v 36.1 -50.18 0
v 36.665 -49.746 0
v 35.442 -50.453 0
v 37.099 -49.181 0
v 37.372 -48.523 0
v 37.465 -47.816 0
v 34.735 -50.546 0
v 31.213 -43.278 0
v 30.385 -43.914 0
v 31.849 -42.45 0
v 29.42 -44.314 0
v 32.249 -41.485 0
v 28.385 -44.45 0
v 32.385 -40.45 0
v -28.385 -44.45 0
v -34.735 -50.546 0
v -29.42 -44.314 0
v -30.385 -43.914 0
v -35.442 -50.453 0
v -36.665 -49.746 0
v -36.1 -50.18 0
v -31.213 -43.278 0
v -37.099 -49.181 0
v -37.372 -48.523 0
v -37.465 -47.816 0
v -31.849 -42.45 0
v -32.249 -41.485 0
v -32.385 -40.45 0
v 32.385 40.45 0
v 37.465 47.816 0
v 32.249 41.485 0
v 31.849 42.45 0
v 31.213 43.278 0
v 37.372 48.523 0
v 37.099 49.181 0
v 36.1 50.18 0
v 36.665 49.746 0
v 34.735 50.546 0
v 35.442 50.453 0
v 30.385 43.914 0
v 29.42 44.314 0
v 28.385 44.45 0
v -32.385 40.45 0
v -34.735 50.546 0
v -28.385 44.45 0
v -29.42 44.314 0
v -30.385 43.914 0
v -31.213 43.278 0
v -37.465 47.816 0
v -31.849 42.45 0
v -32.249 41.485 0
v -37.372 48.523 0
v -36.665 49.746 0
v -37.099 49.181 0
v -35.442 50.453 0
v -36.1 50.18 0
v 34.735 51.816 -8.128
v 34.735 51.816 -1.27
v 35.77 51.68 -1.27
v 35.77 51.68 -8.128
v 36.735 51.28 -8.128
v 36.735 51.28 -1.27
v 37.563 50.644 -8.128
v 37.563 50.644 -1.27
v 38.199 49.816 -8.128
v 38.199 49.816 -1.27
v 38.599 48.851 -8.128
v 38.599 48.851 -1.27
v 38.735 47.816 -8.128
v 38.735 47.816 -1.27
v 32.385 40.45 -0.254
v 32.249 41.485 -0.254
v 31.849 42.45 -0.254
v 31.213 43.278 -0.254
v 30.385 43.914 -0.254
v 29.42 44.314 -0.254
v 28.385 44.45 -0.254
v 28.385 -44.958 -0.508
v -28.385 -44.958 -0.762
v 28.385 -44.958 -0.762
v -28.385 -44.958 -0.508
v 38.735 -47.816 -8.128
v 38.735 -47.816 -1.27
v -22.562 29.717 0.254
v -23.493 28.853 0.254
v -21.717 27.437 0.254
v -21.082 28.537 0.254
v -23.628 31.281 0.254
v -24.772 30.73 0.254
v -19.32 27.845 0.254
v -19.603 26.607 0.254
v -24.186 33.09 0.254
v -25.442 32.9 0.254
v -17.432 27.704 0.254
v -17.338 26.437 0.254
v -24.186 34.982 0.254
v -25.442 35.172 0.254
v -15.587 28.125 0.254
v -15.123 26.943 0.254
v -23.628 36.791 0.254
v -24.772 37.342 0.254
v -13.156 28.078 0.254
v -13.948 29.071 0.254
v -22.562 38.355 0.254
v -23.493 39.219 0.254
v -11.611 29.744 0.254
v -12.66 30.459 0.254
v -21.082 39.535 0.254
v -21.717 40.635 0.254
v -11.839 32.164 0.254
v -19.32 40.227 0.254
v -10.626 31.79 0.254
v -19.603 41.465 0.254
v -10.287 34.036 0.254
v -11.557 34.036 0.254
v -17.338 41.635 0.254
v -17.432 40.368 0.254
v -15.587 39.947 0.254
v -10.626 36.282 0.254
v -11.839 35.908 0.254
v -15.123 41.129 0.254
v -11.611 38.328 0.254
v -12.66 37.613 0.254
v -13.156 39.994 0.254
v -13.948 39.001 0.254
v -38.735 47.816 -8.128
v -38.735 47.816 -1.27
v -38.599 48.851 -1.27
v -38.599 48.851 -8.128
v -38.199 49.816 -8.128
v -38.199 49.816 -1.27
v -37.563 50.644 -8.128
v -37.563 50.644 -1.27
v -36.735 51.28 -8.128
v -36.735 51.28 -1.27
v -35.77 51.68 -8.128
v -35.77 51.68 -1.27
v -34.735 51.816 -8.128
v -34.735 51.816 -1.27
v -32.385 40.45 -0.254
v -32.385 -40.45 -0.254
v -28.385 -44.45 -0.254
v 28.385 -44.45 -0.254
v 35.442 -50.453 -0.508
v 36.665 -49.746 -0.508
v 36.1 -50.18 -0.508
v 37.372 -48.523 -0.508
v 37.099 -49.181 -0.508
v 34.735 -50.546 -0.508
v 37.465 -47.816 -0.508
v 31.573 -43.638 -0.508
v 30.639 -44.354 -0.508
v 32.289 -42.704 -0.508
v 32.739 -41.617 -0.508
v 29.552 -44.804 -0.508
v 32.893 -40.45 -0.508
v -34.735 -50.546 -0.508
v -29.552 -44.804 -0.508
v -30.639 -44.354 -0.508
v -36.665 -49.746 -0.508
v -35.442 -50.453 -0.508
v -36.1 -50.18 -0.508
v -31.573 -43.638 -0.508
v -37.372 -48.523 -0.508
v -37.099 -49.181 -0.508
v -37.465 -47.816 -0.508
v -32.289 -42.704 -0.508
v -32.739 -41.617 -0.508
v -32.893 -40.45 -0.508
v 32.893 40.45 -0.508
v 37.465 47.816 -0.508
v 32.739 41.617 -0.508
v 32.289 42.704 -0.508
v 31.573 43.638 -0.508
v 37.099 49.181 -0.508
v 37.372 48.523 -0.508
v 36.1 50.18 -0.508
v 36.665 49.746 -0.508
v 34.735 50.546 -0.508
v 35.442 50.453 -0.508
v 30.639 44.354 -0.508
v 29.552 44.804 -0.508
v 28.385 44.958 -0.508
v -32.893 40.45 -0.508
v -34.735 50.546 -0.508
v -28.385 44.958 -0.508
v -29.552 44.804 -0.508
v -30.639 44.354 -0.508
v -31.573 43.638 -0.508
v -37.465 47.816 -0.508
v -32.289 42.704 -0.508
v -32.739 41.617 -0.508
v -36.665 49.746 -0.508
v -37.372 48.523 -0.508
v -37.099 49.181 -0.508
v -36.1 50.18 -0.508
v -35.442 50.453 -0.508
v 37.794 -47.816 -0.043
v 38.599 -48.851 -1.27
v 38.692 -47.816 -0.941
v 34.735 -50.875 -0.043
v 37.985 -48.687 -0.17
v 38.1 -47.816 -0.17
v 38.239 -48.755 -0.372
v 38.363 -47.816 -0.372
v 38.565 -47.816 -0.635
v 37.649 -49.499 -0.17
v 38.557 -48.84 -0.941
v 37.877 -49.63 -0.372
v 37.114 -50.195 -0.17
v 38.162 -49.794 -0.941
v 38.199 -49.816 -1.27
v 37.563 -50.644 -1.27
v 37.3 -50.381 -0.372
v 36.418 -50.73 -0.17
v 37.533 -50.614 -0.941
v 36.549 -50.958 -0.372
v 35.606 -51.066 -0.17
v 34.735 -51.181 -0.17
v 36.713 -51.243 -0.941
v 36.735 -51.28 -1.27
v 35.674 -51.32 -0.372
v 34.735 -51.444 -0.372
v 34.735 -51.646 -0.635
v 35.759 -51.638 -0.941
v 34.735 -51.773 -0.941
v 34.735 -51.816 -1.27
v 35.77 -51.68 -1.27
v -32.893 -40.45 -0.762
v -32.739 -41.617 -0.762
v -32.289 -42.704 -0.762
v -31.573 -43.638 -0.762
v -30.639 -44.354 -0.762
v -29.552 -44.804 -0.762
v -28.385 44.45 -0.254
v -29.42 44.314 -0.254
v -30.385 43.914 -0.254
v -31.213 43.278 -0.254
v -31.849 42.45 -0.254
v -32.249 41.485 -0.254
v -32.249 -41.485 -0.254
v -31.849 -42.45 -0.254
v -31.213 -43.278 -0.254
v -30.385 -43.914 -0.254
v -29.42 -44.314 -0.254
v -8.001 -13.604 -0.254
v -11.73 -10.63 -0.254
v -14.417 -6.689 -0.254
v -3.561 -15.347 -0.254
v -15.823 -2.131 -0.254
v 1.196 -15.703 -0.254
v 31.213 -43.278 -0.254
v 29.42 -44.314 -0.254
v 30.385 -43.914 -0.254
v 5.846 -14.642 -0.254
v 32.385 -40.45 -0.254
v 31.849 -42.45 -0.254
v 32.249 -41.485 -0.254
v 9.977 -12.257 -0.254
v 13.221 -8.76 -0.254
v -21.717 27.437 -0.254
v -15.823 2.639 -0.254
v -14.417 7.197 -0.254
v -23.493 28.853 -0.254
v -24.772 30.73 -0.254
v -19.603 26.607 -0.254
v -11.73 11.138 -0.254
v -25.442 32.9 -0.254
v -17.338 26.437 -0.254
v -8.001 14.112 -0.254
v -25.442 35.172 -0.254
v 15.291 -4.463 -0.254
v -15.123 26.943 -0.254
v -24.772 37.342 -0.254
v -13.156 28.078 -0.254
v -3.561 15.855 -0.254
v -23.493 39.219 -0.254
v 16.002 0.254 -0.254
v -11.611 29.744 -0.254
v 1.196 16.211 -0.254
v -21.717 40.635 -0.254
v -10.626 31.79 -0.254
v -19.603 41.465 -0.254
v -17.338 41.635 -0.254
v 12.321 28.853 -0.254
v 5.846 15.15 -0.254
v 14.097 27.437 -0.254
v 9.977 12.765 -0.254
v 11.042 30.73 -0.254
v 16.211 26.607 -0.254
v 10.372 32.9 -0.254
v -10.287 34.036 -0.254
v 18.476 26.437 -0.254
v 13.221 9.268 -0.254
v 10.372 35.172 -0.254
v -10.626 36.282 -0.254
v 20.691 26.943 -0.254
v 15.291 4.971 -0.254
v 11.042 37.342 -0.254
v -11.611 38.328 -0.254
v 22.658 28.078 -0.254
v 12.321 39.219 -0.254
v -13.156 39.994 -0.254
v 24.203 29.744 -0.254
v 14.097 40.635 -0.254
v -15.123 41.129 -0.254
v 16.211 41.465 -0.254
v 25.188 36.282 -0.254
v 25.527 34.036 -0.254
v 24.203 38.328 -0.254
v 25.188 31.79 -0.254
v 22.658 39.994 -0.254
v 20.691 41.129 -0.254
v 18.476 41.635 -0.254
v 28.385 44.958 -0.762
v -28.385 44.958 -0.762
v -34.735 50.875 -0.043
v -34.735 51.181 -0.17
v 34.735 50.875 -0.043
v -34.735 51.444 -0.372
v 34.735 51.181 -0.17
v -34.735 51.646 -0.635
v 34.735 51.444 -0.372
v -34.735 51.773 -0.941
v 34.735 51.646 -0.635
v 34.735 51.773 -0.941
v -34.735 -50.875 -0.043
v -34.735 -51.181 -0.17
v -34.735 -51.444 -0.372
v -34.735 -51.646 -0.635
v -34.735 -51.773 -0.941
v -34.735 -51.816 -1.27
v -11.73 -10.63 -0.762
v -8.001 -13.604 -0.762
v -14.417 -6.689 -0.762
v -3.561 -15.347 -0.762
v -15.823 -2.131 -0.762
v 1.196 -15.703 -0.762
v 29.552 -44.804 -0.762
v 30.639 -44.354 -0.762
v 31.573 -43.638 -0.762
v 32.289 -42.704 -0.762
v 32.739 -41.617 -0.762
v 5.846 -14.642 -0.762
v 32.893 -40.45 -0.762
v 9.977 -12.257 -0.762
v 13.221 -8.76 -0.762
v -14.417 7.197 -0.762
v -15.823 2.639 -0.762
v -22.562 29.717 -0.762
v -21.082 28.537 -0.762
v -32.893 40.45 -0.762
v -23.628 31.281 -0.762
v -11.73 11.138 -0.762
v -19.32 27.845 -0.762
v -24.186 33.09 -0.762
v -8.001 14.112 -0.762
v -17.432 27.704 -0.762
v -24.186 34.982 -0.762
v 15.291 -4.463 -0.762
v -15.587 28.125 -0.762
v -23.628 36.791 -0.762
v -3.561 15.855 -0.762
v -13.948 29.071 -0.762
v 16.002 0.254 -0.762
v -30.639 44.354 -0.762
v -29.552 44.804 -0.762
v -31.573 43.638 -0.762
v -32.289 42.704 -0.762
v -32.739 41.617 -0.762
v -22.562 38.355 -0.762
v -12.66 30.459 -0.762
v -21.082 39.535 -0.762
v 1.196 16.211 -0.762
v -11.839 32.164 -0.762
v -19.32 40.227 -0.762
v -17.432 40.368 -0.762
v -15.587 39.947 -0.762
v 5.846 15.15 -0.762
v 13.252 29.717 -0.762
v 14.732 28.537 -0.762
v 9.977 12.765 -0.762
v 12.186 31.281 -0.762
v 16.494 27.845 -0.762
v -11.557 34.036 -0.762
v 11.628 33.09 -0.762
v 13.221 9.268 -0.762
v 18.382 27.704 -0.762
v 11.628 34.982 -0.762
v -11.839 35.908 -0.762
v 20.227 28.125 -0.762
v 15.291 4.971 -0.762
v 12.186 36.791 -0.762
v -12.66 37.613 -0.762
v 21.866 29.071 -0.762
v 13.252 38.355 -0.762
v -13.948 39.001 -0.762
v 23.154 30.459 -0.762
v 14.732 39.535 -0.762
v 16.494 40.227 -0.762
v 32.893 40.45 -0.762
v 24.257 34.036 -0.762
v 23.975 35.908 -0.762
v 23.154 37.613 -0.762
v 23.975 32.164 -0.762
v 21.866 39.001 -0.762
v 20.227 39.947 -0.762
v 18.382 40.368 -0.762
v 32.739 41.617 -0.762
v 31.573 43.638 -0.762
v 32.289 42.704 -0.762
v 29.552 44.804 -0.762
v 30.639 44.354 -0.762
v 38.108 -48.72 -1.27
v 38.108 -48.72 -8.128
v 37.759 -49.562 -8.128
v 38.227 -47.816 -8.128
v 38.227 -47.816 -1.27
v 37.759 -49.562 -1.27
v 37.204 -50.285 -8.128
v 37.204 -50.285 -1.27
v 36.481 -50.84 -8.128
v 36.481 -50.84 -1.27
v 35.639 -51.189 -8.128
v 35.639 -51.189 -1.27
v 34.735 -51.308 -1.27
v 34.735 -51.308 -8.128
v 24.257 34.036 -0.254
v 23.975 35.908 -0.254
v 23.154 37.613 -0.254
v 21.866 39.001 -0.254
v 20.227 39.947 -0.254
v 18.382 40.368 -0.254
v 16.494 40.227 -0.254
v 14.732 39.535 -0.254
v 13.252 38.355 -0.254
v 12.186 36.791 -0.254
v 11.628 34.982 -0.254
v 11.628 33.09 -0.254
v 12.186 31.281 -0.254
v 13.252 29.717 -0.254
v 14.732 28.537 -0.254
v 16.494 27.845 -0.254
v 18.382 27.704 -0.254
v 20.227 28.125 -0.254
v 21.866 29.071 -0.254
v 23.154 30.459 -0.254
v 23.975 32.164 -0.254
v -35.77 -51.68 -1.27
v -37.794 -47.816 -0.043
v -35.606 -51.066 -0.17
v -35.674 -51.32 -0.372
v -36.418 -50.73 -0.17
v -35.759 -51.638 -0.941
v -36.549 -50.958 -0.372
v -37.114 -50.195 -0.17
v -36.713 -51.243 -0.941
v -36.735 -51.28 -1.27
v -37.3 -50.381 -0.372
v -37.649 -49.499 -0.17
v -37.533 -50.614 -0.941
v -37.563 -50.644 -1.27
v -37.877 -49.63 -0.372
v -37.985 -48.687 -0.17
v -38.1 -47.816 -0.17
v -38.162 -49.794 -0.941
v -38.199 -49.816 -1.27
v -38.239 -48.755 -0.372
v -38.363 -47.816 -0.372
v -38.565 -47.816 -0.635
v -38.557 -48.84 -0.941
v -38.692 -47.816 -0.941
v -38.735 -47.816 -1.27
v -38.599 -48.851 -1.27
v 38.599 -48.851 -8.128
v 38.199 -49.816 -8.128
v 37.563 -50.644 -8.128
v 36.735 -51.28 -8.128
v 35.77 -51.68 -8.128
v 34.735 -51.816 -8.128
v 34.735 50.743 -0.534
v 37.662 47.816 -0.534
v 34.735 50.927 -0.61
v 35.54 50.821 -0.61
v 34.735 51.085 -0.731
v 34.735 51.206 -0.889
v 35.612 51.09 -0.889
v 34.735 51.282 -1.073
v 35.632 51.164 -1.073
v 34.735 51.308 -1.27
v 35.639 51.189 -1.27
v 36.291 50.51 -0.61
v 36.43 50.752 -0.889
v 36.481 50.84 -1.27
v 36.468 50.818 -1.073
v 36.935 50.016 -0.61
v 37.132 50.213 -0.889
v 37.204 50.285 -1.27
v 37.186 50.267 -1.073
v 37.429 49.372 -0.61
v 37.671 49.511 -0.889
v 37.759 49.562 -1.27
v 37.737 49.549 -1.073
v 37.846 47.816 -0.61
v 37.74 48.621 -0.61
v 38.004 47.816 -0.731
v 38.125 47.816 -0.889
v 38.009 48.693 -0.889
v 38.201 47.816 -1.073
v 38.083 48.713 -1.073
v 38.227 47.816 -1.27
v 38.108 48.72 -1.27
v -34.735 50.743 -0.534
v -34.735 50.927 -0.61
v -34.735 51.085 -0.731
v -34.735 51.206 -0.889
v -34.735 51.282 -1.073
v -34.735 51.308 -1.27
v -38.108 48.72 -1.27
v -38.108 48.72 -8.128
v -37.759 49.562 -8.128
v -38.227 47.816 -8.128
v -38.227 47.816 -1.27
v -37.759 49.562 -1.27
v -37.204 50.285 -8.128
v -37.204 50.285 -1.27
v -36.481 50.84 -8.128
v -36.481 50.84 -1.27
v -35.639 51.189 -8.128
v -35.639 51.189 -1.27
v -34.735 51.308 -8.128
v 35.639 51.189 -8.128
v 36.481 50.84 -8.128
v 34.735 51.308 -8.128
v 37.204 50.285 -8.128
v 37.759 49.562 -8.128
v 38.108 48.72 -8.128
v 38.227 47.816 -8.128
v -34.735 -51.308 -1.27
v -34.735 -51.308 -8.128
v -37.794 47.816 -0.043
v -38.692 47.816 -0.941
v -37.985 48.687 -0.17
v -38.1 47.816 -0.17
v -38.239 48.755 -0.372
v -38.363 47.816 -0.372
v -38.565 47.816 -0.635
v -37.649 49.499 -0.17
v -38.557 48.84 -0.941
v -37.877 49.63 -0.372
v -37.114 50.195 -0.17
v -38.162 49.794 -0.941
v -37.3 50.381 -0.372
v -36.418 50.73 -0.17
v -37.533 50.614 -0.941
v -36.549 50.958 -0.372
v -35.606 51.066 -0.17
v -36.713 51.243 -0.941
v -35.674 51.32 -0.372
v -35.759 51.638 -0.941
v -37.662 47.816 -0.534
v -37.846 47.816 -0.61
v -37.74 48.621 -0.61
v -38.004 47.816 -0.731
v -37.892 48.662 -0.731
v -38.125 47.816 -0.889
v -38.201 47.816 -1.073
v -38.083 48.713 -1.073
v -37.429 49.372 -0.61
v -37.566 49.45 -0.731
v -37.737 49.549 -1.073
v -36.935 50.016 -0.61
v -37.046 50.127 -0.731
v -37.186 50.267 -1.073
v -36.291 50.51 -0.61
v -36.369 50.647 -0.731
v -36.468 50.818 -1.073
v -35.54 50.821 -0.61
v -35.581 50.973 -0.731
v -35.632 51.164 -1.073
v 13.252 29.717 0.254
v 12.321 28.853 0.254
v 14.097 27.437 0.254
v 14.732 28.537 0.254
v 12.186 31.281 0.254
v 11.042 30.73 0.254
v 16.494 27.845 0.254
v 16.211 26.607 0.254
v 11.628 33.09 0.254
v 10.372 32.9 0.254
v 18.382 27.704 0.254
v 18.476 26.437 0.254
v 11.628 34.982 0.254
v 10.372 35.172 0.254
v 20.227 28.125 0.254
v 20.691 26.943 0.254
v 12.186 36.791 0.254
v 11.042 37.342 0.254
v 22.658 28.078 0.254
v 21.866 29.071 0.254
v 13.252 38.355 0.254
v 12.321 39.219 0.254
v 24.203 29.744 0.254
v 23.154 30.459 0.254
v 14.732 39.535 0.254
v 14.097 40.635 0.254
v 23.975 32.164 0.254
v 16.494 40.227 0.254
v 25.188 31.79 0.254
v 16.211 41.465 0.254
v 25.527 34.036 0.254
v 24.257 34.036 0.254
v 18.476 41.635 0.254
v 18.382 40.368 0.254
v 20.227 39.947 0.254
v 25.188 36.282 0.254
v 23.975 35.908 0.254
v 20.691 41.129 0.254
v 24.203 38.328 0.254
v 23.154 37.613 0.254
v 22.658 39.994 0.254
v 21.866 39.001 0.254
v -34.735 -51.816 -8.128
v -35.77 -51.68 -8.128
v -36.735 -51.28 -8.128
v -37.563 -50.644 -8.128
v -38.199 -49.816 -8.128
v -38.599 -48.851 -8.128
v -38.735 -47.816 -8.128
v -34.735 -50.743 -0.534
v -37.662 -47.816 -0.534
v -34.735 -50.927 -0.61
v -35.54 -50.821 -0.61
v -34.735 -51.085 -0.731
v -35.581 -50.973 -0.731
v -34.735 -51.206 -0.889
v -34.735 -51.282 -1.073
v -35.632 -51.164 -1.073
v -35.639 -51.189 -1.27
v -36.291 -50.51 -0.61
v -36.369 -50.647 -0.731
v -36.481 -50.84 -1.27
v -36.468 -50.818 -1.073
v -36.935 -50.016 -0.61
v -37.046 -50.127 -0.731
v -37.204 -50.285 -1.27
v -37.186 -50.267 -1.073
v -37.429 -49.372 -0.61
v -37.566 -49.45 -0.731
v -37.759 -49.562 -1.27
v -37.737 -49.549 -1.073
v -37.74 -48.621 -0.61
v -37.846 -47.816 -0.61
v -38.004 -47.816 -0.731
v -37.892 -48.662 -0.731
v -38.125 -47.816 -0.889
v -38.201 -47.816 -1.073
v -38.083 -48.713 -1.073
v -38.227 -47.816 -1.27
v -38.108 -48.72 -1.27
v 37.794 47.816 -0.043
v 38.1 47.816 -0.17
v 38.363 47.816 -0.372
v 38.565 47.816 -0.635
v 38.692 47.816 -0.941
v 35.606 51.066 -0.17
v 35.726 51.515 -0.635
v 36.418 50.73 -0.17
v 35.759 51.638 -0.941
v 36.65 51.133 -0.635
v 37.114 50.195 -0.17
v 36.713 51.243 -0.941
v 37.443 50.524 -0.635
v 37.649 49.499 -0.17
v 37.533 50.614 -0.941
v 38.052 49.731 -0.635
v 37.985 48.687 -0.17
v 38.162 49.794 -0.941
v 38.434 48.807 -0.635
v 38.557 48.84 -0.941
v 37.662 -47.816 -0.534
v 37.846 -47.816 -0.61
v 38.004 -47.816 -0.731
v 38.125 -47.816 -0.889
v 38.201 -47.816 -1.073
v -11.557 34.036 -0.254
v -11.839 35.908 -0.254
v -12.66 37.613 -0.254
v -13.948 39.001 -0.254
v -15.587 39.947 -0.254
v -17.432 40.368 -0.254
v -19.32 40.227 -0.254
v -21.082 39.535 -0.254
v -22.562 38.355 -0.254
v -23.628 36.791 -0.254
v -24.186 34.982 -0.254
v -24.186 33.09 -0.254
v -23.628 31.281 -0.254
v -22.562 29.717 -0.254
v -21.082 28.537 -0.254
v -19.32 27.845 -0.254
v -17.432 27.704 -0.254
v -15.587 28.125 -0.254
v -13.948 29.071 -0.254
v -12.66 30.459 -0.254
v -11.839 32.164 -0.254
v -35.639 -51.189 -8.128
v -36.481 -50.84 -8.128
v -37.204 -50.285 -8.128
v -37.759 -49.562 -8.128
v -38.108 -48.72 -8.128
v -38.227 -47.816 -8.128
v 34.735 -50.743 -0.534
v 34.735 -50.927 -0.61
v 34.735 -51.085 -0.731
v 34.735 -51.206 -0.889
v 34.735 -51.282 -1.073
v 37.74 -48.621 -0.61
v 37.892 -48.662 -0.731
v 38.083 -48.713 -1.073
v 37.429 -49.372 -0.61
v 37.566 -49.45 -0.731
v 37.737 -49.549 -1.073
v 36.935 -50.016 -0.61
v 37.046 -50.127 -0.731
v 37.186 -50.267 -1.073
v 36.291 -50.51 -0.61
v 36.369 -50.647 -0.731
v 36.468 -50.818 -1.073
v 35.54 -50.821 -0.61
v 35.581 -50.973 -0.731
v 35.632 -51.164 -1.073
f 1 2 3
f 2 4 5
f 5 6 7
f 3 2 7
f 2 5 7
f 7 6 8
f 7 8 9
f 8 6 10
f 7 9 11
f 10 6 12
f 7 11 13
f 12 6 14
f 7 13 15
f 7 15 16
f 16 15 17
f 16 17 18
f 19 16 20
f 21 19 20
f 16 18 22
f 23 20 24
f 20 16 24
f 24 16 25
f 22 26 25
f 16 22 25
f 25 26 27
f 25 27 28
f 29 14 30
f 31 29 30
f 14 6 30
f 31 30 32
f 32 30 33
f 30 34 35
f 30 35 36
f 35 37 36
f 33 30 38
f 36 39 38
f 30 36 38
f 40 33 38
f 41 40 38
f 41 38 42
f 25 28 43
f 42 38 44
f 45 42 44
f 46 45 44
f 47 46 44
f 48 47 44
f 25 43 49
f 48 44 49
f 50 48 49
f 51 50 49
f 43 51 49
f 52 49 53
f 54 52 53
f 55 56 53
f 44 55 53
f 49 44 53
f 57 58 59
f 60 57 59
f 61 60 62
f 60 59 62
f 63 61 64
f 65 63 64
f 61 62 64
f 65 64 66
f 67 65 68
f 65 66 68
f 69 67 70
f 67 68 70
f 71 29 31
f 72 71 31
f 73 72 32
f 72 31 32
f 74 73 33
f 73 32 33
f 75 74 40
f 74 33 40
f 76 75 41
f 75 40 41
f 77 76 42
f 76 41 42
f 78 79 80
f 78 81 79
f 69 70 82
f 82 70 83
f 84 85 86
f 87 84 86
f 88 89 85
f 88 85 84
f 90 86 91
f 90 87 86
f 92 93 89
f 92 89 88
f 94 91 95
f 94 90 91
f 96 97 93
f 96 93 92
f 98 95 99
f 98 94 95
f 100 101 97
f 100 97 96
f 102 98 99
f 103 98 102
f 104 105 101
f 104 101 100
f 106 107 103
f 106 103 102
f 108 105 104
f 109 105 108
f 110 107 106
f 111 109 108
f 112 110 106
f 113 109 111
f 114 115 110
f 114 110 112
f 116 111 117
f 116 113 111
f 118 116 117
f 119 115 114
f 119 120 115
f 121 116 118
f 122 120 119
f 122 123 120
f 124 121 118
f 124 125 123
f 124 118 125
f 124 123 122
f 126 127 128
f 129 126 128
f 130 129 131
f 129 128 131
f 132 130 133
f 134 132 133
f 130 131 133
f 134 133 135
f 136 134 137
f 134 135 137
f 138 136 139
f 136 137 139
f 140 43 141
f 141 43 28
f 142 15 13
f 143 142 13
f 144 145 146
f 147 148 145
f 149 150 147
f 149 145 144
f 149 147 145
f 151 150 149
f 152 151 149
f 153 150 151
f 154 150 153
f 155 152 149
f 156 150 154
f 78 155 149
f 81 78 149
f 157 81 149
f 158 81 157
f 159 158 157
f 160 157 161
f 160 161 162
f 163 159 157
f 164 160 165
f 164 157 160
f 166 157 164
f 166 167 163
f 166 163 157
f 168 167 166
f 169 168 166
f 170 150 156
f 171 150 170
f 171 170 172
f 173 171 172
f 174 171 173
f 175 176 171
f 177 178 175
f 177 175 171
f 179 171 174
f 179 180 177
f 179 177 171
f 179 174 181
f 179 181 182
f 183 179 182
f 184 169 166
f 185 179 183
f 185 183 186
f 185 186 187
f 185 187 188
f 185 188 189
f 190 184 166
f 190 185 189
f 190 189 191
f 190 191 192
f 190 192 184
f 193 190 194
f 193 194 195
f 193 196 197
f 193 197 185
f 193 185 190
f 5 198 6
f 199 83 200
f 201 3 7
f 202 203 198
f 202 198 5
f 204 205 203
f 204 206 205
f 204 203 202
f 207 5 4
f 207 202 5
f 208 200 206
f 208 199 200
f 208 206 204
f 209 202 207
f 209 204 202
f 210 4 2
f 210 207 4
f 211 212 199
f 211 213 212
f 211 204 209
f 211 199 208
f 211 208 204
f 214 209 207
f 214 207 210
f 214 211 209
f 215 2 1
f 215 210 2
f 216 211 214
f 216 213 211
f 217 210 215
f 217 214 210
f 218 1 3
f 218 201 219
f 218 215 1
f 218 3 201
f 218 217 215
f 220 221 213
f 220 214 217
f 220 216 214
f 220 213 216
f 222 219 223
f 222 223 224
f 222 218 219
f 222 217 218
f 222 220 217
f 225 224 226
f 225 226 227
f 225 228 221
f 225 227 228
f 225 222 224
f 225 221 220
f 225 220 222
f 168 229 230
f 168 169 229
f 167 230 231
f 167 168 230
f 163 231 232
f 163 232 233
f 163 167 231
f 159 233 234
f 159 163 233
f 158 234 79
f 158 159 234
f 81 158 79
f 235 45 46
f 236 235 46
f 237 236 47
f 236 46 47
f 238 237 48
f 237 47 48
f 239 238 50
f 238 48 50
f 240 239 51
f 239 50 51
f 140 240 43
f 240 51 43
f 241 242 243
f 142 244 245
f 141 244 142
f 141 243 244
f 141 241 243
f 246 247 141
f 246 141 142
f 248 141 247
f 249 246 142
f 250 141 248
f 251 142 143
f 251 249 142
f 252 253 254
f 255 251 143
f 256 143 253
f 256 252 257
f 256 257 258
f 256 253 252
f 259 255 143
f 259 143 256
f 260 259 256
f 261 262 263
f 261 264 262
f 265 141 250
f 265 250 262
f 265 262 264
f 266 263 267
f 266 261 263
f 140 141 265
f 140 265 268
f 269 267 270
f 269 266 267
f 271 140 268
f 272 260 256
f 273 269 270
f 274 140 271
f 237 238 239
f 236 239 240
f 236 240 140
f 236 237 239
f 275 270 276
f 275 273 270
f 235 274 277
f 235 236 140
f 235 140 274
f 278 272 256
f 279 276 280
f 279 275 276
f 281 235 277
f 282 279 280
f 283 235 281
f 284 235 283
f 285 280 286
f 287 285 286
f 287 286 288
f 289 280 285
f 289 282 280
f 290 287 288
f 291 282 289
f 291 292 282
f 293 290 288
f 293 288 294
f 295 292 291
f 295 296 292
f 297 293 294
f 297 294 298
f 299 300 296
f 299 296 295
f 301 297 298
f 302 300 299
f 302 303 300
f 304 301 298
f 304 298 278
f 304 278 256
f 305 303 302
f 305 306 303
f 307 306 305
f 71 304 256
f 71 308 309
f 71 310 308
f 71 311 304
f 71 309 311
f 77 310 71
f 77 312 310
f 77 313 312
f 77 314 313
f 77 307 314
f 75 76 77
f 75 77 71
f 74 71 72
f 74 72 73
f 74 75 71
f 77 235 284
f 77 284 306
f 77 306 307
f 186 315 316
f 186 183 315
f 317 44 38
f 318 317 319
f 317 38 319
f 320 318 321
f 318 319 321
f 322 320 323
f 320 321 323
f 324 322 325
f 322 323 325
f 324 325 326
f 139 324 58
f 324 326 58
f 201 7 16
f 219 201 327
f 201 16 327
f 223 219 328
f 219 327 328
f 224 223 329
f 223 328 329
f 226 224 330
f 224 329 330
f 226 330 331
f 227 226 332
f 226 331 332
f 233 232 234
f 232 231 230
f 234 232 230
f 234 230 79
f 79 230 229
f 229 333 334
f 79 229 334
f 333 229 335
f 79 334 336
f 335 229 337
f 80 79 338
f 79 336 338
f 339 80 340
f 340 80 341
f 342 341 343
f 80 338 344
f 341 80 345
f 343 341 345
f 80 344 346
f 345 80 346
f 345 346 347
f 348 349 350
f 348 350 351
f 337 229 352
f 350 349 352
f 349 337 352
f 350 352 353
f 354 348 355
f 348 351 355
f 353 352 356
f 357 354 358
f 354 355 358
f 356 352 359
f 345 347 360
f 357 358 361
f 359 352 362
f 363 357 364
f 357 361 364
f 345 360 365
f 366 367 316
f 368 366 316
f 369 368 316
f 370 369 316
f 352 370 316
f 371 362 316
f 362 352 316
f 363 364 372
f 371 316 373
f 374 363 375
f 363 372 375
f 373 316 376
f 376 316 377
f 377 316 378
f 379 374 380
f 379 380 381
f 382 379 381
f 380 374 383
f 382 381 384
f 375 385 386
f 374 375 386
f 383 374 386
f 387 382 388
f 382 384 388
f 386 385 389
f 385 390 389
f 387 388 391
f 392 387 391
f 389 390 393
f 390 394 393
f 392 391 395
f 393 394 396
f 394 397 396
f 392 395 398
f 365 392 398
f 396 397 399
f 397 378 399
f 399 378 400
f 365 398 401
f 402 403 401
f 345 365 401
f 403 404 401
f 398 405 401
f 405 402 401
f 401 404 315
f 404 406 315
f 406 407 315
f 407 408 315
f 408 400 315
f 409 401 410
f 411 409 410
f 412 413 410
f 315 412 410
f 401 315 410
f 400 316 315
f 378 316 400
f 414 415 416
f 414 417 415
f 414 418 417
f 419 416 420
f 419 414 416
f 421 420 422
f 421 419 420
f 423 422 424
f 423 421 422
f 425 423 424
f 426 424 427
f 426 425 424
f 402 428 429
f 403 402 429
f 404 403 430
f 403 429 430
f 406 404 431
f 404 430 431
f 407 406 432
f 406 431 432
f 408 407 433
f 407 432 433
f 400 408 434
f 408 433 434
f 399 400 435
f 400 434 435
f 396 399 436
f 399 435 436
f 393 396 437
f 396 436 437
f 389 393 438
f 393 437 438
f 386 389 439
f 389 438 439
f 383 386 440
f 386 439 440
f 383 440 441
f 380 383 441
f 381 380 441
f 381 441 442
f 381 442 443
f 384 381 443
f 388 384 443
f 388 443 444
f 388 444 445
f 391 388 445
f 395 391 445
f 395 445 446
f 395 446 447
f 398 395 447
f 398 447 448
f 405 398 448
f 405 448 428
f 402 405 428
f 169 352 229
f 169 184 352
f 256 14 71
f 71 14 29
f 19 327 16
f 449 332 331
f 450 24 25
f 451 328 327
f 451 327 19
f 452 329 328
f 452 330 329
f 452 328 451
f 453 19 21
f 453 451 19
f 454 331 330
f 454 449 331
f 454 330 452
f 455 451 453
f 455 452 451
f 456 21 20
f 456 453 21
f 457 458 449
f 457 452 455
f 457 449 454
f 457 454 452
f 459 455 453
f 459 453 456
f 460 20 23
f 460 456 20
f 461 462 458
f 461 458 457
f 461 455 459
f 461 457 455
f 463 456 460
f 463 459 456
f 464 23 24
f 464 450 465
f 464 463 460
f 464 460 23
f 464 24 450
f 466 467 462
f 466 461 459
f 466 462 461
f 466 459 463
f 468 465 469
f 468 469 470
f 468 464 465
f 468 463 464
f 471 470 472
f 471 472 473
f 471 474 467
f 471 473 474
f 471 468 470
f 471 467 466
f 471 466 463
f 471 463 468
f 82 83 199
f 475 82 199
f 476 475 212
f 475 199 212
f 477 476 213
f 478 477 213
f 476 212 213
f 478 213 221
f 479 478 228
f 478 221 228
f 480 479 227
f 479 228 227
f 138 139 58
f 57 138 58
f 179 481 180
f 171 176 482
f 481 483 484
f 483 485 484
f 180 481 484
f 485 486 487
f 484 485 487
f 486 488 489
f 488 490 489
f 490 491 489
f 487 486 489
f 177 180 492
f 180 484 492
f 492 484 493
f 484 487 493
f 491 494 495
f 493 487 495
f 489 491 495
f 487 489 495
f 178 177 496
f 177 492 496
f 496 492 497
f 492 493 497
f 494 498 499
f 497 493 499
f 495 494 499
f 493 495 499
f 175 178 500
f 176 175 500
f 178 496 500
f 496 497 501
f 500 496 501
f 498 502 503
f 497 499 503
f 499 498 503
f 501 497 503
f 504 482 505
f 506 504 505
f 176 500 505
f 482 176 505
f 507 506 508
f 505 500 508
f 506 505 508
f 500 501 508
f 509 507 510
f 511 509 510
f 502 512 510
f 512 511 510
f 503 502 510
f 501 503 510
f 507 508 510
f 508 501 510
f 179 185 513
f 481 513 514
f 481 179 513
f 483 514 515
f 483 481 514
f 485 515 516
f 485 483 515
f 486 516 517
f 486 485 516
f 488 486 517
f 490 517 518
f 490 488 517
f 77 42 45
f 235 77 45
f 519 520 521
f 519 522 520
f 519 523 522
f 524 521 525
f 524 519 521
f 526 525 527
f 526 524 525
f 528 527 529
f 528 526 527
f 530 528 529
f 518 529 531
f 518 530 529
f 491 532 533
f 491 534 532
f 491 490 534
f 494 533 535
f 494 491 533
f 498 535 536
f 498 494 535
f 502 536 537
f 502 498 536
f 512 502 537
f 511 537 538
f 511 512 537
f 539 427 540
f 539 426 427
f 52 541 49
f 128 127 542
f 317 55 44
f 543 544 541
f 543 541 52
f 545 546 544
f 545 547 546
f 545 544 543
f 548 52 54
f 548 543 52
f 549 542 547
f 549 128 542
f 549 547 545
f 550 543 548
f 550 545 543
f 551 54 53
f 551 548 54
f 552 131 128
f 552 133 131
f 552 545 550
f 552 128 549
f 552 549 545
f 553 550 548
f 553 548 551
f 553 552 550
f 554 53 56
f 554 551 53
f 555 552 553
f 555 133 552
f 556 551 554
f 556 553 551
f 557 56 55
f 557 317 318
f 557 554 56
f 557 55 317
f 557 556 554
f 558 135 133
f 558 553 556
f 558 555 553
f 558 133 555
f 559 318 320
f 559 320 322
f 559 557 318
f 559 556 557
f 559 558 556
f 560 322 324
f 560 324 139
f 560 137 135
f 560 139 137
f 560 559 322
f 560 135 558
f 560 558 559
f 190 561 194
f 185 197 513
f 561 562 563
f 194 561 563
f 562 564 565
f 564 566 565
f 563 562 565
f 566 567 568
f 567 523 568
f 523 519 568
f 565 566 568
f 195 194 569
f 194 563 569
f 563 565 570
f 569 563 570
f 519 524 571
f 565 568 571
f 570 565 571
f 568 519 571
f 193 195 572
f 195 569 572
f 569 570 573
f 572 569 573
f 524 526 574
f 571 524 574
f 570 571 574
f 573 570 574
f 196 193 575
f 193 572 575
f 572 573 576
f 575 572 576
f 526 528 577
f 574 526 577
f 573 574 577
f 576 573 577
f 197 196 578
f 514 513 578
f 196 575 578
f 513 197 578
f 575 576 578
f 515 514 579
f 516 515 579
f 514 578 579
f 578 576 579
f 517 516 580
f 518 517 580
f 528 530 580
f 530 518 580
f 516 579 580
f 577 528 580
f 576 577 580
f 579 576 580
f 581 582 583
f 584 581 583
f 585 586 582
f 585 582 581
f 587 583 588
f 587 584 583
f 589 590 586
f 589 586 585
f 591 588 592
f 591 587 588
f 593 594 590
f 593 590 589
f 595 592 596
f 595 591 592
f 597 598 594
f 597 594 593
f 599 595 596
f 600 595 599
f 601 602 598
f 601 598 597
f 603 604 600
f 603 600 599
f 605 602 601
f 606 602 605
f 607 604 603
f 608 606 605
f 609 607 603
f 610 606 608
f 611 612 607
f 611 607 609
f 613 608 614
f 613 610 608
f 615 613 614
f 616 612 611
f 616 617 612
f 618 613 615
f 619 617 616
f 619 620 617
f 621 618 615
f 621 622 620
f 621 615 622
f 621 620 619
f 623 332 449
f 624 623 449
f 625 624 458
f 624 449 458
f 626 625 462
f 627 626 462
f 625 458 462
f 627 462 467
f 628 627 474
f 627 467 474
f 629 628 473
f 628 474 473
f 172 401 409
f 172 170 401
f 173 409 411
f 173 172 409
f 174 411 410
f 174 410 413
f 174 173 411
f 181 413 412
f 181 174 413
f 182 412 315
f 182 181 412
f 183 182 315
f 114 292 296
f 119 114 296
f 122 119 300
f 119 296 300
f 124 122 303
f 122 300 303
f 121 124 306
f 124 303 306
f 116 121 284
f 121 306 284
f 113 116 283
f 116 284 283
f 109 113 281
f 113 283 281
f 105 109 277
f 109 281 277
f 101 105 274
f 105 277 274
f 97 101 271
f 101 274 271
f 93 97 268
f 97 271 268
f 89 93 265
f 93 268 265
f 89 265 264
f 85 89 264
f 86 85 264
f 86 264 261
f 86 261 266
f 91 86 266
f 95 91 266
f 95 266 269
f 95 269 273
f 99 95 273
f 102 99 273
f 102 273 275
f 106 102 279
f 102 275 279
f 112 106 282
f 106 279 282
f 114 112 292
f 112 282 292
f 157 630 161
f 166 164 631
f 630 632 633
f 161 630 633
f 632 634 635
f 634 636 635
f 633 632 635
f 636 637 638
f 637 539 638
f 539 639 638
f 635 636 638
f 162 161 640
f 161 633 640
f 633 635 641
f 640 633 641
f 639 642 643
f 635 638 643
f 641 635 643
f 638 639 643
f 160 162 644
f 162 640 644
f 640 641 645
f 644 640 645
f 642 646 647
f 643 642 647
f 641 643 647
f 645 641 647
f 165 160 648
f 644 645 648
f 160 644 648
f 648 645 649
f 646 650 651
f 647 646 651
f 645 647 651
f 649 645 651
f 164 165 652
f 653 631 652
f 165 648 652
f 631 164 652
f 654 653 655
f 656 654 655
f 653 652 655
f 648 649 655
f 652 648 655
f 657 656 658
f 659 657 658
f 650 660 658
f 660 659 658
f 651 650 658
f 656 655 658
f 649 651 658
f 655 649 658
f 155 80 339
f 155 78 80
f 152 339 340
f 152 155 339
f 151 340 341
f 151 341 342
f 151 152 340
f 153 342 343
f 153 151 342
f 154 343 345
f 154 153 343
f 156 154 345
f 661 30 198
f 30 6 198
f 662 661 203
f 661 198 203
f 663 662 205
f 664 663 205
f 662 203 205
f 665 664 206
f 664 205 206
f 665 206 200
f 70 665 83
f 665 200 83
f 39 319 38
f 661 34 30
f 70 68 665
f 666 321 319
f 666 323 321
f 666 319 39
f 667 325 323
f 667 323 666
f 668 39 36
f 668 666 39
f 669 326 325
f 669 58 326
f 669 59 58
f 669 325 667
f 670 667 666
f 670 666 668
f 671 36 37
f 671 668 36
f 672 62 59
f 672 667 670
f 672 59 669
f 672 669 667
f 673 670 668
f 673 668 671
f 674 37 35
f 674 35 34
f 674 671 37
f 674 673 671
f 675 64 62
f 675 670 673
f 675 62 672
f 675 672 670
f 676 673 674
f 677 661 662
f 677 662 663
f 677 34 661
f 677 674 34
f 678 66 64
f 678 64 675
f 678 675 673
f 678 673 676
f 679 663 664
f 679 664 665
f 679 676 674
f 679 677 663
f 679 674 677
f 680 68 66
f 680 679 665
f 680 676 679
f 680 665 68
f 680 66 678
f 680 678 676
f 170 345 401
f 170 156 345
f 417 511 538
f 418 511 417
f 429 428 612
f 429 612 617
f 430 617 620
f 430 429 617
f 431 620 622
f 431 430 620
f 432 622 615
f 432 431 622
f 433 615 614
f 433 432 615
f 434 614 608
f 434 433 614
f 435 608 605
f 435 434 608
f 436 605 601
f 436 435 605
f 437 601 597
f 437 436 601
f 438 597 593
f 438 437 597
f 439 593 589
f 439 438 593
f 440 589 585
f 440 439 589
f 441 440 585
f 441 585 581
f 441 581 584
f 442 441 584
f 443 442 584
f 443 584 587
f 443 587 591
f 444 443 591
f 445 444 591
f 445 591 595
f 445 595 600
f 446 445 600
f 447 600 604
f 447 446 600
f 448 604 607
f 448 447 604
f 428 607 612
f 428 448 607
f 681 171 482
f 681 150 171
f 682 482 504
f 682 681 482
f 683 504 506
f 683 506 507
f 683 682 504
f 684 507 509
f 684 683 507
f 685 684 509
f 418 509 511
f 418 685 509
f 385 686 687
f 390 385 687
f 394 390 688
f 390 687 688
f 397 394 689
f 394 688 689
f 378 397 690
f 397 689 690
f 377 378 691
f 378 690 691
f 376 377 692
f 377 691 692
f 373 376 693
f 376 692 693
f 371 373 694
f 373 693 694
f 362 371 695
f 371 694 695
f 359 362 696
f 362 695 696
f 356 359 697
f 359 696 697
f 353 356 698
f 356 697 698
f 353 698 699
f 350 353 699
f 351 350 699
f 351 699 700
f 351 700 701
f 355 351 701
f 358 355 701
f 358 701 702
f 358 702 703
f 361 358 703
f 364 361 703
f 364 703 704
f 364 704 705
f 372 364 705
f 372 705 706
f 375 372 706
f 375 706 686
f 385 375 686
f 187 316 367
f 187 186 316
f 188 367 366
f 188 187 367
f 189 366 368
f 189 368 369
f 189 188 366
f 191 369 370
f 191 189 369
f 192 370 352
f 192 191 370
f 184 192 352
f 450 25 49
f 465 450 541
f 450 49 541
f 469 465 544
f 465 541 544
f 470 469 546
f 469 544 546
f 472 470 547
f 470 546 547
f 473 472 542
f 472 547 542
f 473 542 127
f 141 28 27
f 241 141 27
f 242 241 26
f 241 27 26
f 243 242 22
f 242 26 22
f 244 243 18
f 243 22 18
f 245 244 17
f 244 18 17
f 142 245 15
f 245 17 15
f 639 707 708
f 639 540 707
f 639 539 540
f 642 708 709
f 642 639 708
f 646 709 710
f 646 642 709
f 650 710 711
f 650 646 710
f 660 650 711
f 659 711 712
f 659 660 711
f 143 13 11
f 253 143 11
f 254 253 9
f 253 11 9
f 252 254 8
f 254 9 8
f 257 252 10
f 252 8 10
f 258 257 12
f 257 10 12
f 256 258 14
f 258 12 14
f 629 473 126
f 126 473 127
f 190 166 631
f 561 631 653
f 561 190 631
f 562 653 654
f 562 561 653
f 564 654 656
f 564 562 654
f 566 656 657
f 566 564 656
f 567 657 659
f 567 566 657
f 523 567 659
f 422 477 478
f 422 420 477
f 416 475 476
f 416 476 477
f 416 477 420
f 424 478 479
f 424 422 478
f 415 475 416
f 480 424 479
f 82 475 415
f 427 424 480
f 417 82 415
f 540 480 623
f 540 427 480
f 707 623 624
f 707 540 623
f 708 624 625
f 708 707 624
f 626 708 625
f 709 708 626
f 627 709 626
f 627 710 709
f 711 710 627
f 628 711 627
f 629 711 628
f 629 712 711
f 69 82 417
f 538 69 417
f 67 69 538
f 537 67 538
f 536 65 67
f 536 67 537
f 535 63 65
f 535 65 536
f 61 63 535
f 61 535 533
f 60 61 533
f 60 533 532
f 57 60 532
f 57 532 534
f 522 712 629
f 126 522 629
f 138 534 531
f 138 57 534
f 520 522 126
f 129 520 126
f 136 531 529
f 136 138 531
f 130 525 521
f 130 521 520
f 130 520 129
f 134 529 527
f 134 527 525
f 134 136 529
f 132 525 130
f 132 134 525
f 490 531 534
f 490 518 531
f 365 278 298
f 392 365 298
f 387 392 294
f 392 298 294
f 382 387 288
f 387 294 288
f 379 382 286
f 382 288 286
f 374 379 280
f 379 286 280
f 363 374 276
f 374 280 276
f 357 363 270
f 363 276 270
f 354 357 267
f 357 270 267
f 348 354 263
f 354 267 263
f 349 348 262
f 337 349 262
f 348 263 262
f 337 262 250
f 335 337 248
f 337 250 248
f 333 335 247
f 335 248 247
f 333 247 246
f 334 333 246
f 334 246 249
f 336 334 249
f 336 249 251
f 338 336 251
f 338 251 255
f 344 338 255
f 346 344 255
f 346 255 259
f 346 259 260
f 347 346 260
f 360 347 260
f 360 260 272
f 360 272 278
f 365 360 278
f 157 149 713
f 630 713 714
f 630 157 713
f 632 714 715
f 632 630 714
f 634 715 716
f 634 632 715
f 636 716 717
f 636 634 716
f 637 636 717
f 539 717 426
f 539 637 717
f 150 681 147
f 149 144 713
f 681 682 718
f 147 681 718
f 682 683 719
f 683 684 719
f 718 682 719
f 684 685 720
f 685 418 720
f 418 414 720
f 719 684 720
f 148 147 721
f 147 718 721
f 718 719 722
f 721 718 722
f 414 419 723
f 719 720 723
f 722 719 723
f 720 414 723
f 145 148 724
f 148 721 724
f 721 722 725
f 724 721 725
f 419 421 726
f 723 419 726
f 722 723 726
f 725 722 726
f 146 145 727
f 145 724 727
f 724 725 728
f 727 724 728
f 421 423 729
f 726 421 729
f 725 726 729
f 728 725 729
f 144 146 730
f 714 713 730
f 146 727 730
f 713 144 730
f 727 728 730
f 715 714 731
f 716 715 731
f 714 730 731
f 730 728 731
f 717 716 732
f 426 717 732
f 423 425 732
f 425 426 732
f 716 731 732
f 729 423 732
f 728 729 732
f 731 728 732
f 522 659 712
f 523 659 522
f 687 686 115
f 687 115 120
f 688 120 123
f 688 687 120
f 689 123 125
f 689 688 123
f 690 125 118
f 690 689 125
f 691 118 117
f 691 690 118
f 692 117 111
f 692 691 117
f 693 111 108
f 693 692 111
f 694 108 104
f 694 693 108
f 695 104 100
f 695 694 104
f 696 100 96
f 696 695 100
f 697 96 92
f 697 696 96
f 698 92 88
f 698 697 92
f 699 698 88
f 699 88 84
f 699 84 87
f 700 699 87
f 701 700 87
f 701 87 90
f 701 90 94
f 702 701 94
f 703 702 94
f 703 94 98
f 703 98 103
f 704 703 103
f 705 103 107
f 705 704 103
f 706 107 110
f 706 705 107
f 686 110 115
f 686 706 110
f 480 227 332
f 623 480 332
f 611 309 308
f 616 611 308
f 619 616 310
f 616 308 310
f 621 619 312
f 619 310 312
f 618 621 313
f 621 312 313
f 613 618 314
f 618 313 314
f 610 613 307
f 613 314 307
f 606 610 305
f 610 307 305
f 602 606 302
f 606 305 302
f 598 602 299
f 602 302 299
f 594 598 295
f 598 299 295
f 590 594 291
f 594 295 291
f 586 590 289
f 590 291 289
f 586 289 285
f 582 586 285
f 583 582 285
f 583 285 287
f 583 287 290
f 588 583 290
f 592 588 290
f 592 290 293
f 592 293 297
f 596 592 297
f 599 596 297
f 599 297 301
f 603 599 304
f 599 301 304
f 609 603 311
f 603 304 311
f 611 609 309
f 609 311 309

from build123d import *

# Parameters (mm, degrees)
BOSS_EXTRUDE1_DEPTH = 8.128
CUT_EXTRUDE1_DEPTH  = 0.254
FILLET3_R           = 1.27
SHELL2_T            = -0.508
SKETCH4_R           = 16.002
SKETCH4_R_2         = 6.35
CUT_EXTRUDE3_DEPTH  = 8.874
SKETCH6_R           = 7.62
SKETCH6_R_2         = 6.35
BOSS_EXTRUDE5_DEPTH = 0.508


with BuildPart() as part:
    # Sketch1 → Boss-Extrude1 (new body)
    with BuildSketch(Plane.XY):
        with BuildLine():
            Line((34.735008, -51.816), (-34.735008, -51.816))
            ThreePointArc((-34.735008, -51.816), (-37.563429468, -50.644429468), (-38.735, -47.816008))
            Line((-38.735, -47.816008), (-38.735, 47.816008))
            ThreePointArc((-38.735, 47.816008), (-37.563429468, 50.644429468), (-34.735008, 51.816))
            Line((-34.735008, 51.816), (34.735008, 51.816))
            ThreePointArc((34.735008, 51.816), (37.563429468, 50.644429468), (38.735, 47.816008))
            Line((38.735, 47.816008), (38.735, -47.816008))
            ThreePointArc((38.735, -47.816008), (37.563429468, -50.644429468), (34.735008, -51.816))
        make_face()
    extrude(amount=-BOSS_EXTRUDE1_DEPTH)

    # Sketch3 → Cut-Extrude1 (cut)
    with BuildSketch(Plane.XY):
        with BuildLine():
            Line((-28.385008, -44.45), (28.385008, -44.45))
            ThreePointArc((28.385008, -44.45), (31.213429468, -43.278429468), (32.385, -40.450008))
            Line((32.385, -40.450008), (32.385, 40.450008))
            ThreePointArc((32.385, 40.450008), (31.213429468, 43.278429468), (28.385008, 44.45))
            Line((28.385008, 44.45), (-28.385008, 44.45))
            ThreePointArc((-28.385008, 44.45), (-31.213429468, 43.278429468), (-32.385, 40.450008))
            Line((-32.385, 40.450008), (-32.385, -40.450008))
            ThreePointArc((-32.385, -40.450008), (-31.213429468, -43.278429468), (-28.385008, -44.45))
        make_face()
    extrude(amount=-CUT_EXTRUDE1_DEPTH, mode=Mode.SUBTRACT)

    # Fillet3
    fillet3_edges = [part.edges().sort_by_distance(p)[0] for p in [
        (38.735, 0, 0),
        (37.563429468, -50.644429468, 0),
        (0, -51.816, 0),
        (-37.563429468, -50.644429468, 0),
        (-38.735, 0, 0),
        (-37.563429468, 50.644429468, 0),
        (0, 51.816, 0),
        (37.563429468, 50.644429468, 0),
    ]]
    fillet(fillet3_edges, radius=FILLET3_R)

    # Shell2
    shell2_openings = [part.faces().sort_by_distance(p)[0] for p in [
        (0, 0, -8.128),
    ]]
    offset(amount=SHELL2_T, openings=shell2_openings, kind=Kind.INTERSECTION)

    # Sketch4 → Cut-Extrude3 (cut, through all)
    with BuildSketch(Plane.XY.offset(-0.254)):
        with Locations((0, 0.254)):
            Circle(SKETCH4_R)
        with Locations((17.907, 34.036)):
            Circle(SKETCH4_R_2)
        with Locations((-17.907, 34.036)):
            Circle(SKETCH4_R_2)
    extrude(amount=-CUT_EXTRUDE3_DEPTH, mode=Mode.SUBTRACT)

    # Sketch6 → Boss-Extrude5 (add)
    with BuildSketch(Plane.XY.offset(-0.254)):
        with Locations((-17.907, 34.036)):
            Circle(SKETCH6_R)
        with Locations((-17.907, 34.036)):
            Circle(SKETCH6_R_2, mode=Mode.SUBTRACT)
        with Locations((17.907, 34.036)):
            Circle(SKETCH6_R)
        with Locations((17.907, 34.036)):
            Circle(SKETCH6_R_2, mode=Mode.SUBTRACT)
    extrude(amount=BOSS_EXTRUDE5_DEPTH)


solid = part.part
